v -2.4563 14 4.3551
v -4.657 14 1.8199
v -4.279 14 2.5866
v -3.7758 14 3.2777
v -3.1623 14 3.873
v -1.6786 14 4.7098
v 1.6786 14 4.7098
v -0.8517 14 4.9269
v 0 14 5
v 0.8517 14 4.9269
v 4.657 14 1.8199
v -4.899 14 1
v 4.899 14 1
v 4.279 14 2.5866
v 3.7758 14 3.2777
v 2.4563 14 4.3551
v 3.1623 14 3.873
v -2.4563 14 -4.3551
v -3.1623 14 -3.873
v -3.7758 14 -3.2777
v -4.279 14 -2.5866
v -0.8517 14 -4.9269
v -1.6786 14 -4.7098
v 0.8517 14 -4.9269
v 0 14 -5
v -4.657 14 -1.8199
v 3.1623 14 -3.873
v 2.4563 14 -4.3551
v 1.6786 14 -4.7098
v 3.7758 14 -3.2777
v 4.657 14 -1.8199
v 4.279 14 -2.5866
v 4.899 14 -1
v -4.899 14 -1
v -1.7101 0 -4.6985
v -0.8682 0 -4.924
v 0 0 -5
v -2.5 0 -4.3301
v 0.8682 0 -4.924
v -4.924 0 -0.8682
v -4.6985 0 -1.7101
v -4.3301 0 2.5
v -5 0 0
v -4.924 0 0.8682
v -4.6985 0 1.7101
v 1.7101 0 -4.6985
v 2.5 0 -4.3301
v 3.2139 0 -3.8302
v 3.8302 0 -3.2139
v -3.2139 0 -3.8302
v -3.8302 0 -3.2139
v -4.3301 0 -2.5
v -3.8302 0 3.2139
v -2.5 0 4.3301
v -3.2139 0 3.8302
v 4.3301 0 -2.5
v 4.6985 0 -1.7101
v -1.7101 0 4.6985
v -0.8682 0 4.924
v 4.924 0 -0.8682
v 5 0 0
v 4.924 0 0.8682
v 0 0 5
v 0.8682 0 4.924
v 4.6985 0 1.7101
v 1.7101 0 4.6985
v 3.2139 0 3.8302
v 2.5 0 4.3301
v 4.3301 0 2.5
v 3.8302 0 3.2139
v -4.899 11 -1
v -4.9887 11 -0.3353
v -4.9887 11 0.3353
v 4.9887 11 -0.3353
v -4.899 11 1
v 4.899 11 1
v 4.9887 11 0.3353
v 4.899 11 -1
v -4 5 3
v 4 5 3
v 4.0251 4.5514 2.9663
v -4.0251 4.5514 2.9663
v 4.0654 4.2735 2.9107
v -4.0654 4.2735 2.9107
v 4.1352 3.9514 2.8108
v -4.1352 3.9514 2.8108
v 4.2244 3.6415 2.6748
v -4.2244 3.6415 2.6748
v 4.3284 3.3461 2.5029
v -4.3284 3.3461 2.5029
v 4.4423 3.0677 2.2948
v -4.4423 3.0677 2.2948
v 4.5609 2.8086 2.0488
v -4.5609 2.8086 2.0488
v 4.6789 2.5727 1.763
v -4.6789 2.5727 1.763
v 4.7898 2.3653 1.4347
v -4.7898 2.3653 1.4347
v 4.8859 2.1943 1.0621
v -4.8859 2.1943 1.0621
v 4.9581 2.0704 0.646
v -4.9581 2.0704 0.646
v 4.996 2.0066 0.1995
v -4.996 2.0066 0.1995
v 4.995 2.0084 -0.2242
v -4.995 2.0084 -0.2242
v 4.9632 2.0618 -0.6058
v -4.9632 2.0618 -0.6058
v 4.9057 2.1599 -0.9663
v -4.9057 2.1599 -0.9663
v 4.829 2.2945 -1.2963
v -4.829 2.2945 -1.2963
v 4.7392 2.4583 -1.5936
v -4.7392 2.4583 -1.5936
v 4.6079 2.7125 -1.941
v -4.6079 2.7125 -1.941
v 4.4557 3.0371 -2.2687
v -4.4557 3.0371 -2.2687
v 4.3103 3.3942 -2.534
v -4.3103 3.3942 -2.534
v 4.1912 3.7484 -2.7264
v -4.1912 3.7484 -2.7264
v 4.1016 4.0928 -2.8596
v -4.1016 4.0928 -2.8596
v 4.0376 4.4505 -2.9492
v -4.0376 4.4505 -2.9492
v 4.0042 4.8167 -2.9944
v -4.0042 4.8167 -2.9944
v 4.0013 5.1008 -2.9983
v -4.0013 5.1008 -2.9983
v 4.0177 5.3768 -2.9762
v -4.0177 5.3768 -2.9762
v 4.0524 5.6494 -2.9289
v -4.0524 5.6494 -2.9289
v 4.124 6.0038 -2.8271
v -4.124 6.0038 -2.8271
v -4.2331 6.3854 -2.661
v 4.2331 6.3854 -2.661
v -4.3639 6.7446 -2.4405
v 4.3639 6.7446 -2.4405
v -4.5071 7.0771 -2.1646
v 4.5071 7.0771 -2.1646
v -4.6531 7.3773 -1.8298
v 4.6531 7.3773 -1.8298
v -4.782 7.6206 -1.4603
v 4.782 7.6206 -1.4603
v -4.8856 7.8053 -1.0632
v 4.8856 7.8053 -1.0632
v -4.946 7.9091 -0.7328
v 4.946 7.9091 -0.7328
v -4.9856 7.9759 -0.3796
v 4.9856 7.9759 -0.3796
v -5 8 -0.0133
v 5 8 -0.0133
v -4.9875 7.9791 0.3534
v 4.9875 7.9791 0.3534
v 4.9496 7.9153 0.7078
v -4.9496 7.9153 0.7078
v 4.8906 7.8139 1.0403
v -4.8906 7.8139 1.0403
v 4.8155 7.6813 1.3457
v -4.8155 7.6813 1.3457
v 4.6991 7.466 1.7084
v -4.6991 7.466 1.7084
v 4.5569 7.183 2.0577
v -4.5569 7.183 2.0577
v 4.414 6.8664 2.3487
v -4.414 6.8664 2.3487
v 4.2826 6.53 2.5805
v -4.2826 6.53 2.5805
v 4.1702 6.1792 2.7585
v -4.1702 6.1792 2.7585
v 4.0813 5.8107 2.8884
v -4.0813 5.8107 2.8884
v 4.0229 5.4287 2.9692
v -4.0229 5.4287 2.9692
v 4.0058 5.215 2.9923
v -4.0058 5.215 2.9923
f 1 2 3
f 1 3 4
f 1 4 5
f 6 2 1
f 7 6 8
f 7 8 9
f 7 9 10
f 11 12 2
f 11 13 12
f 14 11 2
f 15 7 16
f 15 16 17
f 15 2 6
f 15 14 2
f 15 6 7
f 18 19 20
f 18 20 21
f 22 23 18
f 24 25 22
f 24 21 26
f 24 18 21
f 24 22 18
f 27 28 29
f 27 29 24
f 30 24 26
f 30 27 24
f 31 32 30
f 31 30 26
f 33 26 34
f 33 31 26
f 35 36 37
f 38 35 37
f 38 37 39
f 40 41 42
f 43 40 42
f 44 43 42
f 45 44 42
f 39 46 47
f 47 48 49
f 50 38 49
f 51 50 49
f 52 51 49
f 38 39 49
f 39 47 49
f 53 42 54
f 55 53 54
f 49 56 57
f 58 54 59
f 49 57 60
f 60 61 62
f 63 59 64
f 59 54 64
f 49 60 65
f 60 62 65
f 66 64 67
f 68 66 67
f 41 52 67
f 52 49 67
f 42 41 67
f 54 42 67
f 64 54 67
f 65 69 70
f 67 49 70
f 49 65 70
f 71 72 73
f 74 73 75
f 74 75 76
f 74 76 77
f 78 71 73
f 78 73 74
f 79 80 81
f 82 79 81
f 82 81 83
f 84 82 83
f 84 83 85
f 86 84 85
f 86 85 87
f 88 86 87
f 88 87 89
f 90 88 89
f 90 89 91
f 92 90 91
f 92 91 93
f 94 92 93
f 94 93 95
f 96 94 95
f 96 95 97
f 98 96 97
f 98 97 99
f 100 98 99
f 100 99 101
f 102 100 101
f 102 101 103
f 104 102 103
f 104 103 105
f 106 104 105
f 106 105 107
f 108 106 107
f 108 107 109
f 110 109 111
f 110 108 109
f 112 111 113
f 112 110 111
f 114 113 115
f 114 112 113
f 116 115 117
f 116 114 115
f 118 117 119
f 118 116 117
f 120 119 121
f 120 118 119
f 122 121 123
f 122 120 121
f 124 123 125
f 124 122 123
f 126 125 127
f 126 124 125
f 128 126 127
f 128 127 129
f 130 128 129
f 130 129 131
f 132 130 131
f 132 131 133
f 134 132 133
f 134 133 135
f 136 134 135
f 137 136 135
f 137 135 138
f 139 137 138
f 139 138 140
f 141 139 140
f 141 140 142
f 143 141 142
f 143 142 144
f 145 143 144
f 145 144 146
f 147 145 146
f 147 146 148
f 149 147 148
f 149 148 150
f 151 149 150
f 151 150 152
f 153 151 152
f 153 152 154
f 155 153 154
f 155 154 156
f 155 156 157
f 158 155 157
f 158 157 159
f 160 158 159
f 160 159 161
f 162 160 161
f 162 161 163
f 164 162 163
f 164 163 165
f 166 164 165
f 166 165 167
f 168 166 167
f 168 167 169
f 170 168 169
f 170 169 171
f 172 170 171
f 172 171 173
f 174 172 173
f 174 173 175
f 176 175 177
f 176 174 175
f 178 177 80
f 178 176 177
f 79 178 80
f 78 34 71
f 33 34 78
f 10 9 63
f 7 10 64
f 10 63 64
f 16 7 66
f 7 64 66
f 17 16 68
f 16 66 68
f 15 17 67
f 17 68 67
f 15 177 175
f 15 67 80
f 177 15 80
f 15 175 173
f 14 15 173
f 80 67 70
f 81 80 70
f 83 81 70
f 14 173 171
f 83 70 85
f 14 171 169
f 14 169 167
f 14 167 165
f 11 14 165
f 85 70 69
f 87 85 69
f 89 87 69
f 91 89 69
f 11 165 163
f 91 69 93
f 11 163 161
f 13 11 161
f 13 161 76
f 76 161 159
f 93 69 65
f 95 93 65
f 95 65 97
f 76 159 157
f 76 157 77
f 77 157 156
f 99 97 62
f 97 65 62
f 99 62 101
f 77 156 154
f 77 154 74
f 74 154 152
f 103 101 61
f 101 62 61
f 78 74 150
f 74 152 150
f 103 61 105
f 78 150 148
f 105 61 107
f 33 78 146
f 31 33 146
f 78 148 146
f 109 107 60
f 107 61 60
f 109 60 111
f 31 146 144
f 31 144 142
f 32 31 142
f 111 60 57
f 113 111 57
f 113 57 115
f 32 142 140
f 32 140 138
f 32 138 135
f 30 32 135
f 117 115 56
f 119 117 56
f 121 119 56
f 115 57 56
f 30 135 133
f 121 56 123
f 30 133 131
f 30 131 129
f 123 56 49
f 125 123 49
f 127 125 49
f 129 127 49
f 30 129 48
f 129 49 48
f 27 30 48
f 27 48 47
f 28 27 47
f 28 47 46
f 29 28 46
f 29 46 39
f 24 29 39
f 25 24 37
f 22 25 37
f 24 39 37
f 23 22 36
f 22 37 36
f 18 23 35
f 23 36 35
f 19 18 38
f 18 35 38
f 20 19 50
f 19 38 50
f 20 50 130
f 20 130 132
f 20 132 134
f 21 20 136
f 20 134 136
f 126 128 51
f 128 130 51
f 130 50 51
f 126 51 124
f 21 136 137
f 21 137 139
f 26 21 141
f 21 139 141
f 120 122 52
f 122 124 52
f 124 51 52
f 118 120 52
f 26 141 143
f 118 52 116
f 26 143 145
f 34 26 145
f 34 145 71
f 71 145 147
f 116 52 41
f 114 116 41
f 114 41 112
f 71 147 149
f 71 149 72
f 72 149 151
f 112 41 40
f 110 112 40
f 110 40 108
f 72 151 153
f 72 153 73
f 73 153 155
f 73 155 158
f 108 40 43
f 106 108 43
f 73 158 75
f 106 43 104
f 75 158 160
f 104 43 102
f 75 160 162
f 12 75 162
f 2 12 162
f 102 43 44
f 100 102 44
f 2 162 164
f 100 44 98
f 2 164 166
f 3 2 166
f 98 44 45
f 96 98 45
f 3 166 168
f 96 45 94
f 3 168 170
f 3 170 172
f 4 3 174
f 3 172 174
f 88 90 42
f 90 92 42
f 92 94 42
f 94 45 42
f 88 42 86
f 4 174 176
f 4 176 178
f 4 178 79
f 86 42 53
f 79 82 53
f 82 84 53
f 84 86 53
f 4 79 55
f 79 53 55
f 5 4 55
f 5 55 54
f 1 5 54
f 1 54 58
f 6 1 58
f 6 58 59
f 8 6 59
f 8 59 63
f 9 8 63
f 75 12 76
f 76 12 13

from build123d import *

# Parameters (mm, degrees)
SKETCH_1_R               = 5
EXTRUDE_1_DEPTH          = 14
SKETCH_2_W               = 13.996795202
SKETCH_2_H               = 2
CUT_EXTRUDE_1_DEPTH      = 3
CUT_EXTRUDE_2_DEPTH      = 13
CUT_EXTRUDE_2_DEPTH_BACK = 13
SKETCH_3_R               = 3


with BuildPart() as part:
    # 스케치1 → 보스-돌출1 (new body)
    with BuildSketch(Plane(origin=(0, 0, 0), x_dir=(1, 0, 0), z_dir=(0, 1, 0))):
        Circle(SKETCH_1_R)
    extrude(amount=EXTRUDE_1_DEPTH)

    # 스케치2 → 컷-돌출1 (cut)
    with BuildSketch(Plane(origin=(0, 14, 0), x_dir=(1, 0, 0), z_dir=(0, 1, 0))):
        Rectangle(SKETCH_2_W, SKETCH_2_H)
    extrude(amount=-CUT_EXTRUDE_1_DEPTH, mode=Mode.SUBTRACT)

    # 스케치3 → 컷-돌출2 (cut, two sides: drawn at the far end of the back side and taken through both)
    with BuildSketch(Plane(origin=(0, 0, 0), x_dir=(0, 0, -1), z_dir=(1, 0, 0)).offset(-CUT_EXTRUDE_2_DEPTH_BACK)):
        with Locations((0, 5)):
            Circle(SKETCH_3_R)
    extrude(amount=CUT_EXTRUDE_2_DEPTH + CUT_EXTRUDE_2_DEPTH_BACK, mode=Mode.SUBTRACT)


solid = part.part
